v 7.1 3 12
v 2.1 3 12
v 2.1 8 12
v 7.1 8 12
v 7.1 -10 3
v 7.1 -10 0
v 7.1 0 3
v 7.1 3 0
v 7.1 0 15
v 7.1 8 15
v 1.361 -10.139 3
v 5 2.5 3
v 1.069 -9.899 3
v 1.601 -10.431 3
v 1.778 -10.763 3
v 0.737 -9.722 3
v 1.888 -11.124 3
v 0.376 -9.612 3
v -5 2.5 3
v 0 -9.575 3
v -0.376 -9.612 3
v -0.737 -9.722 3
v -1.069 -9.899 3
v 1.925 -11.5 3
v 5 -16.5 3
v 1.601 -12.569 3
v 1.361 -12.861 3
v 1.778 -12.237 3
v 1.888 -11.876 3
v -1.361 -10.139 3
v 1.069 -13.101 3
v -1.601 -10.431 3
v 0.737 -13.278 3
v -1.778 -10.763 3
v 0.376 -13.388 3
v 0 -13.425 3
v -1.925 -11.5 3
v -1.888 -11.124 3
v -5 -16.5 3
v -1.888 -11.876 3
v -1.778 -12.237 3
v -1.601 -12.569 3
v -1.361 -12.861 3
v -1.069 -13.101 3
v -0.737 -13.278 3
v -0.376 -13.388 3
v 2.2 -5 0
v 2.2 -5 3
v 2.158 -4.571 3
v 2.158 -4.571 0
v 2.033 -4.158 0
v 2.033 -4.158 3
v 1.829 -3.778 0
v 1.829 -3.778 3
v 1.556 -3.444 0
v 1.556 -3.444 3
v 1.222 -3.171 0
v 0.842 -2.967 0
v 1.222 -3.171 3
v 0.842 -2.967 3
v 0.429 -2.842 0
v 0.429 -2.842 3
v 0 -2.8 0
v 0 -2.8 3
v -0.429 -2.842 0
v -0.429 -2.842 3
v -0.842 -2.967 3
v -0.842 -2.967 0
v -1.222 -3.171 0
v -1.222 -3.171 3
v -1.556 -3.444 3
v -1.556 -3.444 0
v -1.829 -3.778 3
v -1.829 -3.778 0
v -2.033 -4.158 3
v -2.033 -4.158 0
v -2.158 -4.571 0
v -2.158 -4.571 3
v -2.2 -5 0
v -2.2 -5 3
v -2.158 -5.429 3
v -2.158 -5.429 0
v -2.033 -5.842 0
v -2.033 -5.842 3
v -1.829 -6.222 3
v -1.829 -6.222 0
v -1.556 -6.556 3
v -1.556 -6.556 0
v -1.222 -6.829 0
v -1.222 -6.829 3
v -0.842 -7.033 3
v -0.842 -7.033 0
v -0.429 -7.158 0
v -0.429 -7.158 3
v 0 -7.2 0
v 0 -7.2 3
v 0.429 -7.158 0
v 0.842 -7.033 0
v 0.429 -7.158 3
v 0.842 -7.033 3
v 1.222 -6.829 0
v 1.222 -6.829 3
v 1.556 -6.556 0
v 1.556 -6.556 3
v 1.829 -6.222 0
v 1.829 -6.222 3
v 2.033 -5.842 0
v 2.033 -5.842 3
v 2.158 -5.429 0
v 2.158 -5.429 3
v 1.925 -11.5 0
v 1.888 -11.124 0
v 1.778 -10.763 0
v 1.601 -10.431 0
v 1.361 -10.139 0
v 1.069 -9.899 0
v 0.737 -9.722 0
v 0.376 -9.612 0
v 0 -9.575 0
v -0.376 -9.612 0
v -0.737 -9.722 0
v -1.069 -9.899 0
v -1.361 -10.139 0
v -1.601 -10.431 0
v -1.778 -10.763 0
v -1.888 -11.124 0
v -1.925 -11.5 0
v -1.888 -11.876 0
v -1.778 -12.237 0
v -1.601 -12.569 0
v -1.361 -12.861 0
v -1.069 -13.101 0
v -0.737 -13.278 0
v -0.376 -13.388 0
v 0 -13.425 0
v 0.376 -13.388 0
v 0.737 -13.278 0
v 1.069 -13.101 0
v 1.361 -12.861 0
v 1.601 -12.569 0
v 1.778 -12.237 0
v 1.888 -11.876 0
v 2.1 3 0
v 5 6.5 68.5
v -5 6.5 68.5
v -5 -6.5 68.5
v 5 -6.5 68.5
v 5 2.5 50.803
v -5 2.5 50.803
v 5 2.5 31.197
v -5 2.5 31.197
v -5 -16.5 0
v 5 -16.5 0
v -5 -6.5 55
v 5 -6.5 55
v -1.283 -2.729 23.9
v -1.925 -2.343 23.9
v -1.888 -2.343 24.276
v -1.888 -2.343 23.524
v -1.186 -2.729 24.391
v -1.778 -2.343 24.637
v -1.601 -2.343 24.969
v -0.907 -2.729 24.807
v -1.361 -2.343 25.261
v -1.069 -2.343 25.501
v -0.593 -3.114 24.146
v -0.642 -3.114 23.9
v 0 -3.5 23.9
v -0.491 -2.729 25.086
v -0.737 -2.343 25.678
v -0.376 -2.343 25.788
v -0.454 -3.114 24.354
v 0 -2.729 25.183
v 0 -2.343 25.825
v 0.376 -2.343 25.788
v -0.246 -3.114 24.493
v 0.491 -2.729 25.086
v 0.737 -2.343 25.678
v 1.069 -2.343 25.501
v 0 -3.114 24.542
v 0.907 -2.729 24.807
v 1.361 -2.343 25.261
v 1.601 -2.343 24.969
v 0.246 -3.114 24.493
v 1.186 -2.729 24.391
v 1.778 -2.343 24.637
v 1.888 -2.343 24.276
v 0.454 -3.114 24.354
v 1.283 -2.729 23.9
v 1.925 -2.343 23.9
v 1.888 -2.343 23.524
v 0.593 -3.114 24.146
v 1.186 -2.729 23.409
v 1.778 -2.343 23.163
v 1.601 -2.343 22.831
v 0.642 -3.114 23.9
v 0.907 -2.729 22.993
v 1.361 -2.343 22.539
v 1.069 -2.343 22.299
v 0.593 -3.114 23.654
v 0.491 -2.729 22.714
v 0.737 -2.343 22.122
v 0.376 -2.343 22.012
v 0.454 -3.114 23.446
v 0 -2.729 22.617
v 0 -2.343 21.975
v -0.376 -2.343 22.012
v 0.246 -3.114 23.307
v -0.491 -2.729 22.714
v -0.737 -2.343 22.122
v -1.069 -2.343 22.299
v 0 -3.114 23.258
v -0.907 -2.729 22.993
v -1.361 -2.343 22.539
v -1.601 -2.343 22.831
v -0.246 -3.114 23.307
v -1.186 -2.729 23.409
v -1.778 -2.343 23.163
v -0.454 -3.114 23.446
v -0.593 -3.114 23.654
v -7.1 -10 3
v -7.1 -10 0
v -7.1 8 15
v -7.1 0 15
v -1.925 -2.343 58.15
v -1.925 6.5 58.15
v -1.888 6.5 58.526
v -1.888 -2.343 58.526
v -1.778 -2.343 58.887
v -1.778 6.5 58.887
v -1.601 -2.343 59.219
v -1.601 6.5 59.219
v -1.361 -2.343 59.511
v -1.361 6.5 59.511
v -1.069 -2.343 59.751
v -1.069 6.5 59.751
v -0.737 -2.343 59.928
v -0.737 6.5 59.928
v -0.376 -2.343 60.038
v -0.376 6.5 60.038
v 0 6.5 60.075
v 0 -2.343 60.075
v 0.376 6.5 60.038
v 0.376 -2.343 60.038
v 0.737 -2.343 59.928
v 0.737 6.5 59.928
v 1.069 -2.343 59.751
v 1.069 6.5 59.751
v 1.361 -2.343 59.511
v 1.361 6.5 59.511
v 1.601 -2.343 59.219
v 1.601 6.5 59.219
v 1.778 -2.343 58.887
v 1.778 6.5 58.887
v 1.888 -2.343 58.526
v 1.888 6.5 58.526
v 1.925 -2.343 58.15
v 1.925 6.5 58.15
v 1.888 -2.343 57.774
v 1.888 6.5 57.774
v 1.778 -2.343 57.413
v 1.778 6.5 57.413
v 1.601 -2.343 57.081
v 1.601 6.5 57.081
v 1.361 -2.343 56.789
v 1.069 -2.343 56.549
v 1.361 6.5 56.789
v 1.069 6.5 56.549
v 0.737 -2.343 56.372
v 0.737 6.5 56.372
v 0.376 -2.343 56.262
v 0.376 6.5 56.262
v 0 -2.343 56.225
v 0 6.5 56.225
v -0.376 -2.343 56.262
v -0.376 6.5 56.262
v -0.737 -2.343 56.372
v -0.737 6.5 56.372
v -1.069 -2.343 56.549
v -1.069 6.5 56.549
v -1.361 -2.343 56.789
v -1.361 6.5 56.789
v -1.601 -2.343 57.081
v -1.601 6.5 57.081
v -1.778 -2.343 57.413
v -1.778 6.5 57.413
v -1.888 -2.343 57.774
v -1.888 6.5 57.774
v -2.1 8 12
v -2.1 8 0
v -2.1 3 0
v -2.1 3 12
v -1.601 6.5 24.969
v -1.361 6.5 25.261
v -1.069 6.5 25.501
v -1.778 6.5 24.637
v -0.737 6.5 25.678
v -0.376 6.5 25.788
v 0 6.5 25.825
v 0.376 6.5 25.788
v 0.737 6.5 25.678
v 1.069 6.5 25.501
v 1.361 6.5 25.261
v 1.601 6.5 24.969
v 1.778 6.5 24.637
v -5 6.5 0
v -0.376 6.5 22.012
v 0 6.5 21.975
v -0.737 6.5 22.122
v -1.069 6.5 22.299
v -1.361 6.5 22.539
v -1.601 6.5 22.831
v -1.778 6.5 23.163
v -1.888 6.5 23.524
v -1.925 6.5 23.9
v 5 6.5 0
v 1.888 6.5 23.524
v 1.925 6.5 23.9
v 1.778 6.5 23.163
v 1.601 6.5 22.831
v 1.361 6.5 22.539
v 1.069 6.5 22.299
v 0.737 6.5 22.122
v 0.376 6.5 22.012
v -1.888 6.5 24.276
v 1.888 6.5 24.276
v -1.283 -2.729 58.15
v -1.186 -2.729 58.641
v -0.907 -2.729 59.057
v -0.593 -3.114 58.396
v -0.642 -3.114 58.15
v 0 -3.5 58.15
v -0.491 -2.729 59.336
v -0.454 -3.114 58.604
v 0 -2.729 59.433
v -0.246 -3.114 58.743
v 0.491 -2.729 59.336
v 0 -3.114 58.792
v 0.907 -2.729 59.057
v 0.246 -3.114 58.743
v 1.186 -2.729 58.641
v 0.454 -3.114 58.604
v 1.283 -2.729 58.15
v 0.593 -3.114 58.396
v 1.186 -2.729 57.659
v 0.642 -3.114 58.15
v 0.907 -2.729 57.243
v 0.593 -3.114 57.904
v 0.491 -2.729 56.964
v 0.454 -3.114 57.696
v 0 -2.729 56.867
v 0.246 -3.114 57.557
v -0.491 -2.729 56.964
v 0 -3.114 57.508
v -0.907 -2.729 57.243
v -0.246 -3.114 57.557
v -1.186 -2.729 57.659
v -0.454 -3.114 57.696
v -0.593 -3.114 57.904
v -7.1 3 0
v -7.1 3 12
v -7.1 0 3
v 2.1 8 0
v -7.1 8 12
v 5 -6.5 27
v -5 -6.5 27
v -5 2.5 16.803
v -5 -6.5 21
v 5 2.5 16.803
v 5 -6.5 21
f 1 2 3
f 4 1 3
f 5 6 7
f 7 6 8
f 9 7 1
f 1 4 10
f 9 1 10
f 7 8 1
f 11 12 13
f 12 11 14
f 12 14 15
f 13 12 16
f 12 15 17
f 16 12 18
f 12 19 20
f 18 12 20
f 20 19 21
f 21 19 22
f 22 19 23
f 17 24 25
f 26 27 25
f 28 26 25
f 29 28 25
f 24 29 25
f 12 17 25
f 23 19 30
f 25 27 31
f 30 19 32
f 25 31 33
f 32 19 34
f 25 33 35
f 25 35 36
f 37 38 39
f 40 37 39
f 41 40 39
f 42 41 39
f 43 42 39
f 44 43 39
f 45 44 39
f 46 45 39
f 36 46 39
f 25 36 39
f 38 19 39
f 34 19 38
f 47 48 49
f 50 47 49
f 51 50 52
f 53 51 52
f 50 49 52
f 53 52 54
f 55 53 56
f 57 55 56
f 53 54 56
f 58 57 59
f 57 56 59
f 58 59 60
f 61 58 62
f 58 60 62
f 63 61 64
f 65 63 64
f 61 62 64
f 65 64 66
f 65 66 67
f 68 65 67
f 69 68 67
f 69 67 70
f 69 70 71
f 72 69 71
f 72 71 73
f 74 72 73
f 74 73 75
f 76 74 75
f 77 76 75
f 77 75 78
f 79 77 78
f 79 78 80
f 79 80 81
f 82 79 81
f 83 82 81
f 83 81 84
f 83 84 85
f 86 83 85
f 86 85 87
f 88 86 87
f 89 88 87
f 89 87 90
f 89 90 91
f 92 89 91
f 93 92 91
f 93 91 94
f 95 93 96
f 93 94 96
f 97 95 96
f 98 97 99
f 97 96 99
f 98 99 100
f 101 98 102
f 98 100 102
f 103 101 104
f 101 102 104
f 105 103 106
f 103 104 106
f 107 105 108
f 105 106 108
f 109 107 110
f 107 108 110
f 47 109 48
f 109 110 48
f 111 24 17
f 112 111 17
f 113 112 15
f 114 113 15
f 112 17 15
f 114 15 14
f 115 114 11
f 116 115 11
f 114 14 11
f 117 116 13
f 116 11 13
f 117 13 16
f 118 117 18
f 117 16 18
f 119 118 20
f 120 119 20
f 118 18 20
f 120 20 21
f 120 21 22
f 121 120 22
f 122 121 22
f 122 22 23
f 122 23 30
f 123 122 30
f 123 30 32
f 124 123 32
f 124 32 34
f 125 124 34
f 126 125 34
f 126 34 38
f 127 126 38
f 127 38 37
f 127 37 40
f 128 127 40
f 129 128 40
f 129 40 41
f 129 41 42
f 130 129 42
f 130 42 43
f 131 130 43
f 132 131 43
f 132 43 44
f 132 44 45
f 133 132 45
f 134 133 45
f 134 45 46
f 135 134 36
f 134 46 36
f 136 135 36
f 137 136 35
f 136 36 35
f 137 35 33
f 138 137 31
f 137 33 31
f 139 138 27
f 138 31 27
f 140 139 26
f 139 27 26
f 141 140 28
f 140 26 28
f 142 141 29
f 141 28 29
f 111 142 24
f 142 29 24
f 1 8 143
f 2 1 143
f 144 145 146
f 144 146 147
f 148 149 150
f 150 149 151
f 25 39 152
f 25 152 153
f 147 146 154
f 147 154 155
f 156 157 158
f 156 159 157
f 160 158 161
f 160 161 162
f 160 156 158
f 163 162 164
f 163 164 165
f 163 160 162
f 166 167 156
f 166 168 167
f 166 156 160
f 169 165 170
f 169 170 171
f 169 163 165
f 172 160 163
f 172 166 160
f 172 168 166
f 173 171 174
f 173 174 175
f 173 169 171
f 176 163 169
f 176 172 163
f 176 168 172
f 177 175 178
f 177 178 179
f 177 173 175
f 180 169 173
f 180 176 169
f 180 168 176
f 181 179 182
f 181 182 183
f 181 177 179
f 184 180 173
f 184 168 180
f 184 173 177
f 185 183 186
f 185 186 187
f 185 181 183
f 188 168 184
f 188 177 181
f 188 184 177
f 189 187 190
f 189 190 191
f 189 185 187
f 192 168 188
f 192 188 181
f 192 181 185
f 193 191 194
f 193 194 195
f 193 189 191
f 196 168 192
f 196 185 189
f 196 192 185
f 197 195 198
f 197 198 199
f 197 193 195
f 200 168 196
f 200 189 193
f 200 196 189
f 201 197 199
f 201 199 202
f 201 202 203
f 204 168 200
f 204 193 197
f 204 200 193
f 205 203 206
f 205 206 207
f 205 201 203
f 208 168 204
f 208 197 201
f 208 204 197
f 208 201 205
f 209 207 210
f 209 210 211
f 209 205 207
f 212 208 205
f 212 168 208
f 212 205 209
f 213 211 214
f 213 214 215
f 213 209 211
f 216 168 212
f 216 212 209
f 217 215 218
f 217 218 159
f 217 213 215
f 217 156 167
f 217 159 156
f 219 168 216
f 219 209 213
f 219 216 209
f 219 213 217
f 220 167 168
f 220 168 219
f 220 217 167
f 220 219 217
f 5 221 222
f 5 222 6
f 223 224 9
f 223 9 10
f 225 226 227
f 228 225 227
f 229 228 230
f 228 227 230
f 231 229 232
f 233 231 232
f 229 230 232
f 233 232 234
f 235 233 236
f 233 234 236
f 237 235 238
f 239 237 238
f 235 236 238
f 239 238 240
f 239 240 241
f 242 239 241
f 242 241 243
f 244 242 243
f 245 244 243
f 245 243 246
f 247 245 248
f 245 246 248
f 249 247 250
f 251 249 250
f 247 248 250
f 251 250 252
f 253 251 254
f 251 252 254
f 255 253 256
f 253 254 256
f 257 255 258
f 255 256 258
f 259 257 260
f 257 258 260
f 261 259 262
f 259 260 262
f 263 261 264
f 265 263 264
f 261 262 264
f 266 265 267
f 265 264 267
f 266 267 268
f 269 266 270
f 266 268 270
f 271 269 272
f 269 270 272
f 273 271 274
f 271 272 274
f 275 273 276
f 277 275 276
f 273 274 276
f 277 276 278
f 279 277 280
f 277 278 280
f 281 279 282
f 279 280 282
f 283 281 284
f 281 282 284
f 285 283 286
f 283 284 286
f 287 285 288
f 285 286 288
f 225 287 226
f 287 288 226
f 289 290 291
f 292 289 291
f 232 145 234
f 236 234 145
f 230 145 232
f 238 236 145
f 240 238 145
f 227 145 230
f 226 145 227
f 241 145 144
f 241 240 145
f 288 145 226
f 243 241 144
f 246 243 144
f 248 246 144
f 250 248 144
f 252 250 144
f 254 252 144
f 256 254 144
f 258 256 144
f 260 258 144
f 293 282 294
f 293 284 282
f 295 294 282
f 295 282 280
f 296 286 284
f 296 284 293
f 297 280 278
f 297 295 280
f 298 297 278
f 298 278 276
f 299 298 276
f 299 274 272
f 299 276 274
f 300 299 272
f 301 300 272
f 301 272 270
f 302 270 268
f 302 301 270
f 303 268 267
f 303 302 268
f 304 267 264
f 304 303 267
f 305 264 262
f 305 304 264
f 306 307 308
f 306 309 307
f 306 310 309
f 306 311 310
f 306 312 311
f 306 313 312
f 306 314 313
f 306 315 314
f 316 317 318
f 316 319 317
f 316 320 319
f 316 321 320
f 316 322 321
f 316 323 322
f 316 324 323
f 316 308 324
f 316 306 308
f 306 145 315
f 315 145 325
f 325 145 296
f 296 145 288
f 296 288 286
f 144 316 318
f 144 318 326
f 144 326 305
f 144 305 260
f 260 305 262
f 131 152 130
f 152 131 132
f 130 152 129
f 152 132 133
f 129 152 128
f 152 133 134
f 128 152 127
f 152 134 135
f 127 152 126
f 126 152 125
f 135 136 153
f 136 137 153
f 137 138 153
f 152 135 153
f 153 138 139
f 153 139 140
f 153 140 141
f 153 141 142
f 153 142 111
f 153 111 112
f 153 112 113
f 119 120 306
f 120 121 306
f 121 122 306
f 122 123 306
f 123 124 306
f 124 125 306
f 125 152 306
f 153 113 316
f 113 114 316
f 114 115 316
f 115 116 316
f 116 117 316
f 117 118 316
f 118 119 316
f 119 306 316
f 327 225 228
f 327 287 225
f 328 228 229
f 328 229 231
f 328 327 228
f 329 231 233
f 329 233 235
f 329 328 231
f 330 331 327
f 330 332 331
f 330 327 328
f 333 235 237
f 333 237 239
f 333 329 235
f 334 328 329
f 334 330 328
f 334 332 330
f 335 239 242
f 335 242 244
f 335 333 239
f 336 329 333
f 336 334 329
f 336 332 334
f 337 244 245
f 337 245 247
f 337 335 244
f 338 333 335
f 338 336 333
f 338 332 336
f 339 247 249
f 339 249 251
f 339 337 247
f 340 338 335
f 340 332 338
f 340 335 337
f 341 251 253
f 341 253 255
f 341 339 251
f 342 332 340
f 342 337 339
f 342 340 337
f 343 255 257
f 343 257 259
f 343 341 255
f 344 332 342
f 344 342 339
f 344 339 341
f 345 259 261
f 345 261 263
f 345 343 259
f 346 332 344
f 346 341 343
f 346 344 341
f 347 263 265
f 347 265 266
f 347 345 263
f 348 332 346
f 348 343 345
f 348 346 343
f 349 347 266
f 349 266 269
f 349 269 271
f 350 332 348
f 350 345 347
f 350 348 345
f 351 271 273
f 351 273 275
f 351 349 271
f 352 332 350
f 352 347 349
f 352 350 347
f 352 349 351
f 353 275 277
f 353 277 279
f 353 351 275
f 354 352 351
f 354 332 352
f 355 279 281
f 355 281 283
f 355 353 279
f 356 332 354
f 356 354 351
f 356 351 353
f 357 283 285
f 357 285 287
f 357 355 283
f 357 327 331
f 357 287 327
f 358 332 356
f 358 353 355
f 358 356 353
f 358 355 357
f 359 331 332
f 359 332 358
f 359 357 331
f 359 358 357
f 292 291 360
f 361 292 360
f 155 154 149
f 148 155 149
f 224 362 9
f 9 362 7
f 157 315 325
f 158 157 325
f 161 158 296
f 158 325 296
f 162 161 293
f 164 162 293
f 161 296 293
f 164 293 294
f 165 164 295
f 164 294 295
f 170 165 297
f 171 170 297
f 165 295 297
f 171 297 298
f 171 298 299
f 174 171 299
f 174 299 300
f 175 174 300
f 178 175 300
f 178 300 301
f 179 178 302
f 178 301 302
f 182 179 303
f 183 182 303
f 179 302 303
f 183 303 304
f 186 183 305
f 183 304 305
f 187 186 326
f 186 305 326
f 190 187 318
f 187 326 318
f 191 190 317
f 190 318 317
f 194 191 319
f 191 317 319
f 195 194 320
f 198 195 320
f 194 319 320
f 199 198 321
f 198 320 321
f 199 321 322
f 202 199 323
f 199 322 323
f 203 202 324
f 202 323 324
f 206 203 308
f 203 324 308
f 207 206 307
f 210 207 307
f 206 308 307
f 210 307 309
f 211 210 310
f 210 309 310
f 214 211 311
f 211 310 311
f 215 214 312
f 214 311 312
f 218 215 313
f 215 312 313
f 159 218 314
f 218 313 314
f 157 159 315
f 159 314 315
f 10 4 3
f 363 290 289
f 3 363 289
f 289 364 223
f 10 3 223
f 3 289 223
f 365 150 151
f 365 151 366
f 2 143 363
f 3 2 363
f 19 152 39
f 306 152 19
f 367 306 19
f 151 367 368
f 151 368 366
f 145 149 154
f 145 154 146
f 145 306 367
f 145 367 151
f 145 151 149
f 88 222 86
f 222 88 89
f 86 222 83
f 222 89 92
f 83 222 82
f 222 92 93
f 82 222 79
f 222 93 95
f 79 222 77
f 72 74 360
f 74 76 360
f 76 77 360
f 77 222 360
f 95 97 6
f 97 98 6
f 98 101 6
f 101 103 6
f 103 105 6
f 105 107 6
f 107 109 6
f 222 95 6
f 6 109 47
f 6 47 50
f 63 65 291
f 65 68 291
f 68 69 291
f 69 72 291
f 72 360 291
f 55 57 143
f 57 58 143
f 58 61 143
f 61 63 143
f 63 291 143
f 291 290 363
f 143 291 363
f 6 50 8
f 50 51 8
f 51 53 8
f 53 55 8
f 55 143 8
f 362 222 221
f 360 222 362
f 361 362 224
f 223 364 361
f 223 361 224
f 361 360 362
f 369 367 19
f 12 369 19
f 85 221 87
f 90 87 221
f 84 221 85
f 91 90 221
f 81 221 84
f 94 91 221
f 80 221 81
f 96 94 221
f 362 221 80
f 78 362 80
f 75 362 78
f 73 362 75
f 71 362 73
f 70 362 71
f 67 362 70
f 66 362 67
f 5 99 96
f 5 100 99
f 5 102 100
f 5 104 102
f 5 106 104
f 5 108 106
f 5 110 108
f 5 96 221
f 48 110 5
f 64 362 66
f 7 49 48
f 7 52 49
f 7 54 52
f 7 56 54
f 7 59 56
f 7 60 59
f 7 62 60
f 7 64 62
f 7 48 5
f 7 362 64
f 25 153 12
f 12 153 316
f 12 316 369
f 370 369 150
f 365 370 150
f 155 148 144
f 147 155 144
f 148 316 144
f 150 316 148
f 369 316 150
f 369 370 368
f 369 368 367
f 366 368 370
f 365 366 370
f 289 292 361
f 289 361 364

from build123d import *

# Parameters (mm, degrees)
SKETCH_W          = 10
SKETCH_H          = 13
PAD_DEPTH         = 68.5
SKETCH001_W       = 10
SKETCH001_H       = 3
PAD001_DEPTH      = 10
SKETCH002_R       = 1.925
HOLE_DEPTH        = 8.843343
HOLE_TIPS_R       = 1.925
POCKET_DEPTH      = 10.001
SKETCH004_R       = 1.925
HOLE001_DEPTH     = 25
PAD002_DEPTH      = 15
SKETCH006_W       = 5
SKETCH006_H       = 3
PAD003_DEPTH      = 5
PAD003_DEPTH_BACK = 9.2
SKETCH007_W       = 14.2
SKETCH007_H       = 3
PAD004_DEPTH      = 10
SKETCH008_R       = 2.2
HOLE002_DEPTH     = 25


with BuildPart() as body1:
    # Sketch → Pad (new body)
    with BuildSketch(Plane.XY):
        Rectangle(SKETCH_W, SKETCH_H)
    extrude(amount=PAD_DEPTH)

    # Sketch001 (on Face3 of Pad) → Pad001 (join)
    with BuildSketch(Plane.XZ.offset(6.5)):
        with Locations((0, 1.5)):
            Rectangle(SKETCH001_W, SKETCH001_H)
    extrude(amount=PAD001_DEPTH)

    # Sketch002 (on Face1 of Pad001) → Hole (cut)
    with BuildSketch(Plane(origin=(0, 6.5, 0), x_dir=(-1, 0, 0), z_dir=(0, 1, 0))):
        with Locations((0, 58.15)):
            Circle(SKETCH002_R)
        with Locations((0, 23.9)):
            Circle(SKETCH002_R)
    extrude(amount=-HOLE_DEPTH, mode=Mode.SUBTRACT)

    # Hole tips → Hole tip 1 section 0
    with BuildSketch(Plane(origin=(0, -2.343343, 0), x_dir=(-1, 0, 0), z_dir=(0, 1, 0)), mode=Mode.PRIVATE) as hole_tip_1_s0:
        with Locations((0, 58.15)):
            Circle(HOLE_TIPS_R)
    loft([hole_tip_1_s0.sketch, Vertex(0, -3.5, 58.15)], mode=Mode.SUBTRACT)

    # Hole tips → Hole tip 2 section 0
    with BuildSketch(Plane(origin=(0, -2.343343, 0), x_dir=(-1, 0, 0), z_dir=(0, 1, 0)), mode=Mode.PRIVATE) as hole_tip_2_s0:
        with Locations((0, 23.9)):
            Circle(HOLE_TIPS_R)
    loft([hole_tip_2_s0.sketch, Vertex(0, -3.5, 23.9)], mode=Mode.SUBTRACT)

    # Sketch003 (on Face2 of Hole) → Pocket (cut, through all)
    with BuildSketch(Plane(origin=(-5, 0, 0), x_dir=(0, -1, 0), z_dir=(-1, 0, 0))):
        Polygon((6.5, 55), (-2.5, 50.803231), (-2.5, 31.196769), (6.5, 27), align=None)
        Polygon((6.5, 21), (-2.5, 16.803231), (-2.5, 3), (6.5, 3), align=None)
    extrude(amount=-POCKET_DEPTH, mode=Mode.SUBTRACT)

    # Sketch004 (on Face21 of Pocket) → Hole001 (cut)
    with BuildSketch(Plane.XY.offset(3)):
        with Locations((0, -11.5)):
            Circle(SKETCH004_R)
    extrude(amount=-HOLE001_DEPTH, mode=Mode.SUBTRACT)


with BuildPart() as body2:
    # Sketch005 → Pad002 (new body)
    with BuildSketch(Plane.XY):
        Polygon((-2.1, 8), (-2.1, 3), (-7.1, 3), (-7.1, 0), (7.1, 0), (7.1, 3), (2.1, 3), (2.1, 8), align=None)
    extrude(amount=PAD002_DEPTH)

    # Sketch006 (on Face7 of Pad002) → Pad003 (join, two sides)
    with BuildSketch(Plane.YZ.offset(2.1)) as pad003_sk:
        with Locations((5.5, 13.5)):
            Rectangle(SKETCH006_W, SKETCH006_H)
    extrude(amount=PAD003_DEPTH)
    extrude(pad003_sk.sketch, amount=-PAD003_DEPTH_BACK)

    # Sketch007 (on Face7 of Pad003) → Pad004 (join)
    with BuildSketch(Plane.XZ):
        with Locations((0, 1.5)):
            Rectangle(SKETCH007_W, SKETCH007_H)
    extrude(amount=PAD004_DEPTH)

    # Sketch008 (on Face24 of Pad004) → Hole002 (cut)
    with BuildSketch(Plane.XY.offset(3)):
        with Locations((0, -5)):
            Circle(SKETCH008_R)
    extrude(amount=-HOLE002_DEPTH, mode=Mode.SUBTRACT)


solid = Compound([body1.part, body2.part])
